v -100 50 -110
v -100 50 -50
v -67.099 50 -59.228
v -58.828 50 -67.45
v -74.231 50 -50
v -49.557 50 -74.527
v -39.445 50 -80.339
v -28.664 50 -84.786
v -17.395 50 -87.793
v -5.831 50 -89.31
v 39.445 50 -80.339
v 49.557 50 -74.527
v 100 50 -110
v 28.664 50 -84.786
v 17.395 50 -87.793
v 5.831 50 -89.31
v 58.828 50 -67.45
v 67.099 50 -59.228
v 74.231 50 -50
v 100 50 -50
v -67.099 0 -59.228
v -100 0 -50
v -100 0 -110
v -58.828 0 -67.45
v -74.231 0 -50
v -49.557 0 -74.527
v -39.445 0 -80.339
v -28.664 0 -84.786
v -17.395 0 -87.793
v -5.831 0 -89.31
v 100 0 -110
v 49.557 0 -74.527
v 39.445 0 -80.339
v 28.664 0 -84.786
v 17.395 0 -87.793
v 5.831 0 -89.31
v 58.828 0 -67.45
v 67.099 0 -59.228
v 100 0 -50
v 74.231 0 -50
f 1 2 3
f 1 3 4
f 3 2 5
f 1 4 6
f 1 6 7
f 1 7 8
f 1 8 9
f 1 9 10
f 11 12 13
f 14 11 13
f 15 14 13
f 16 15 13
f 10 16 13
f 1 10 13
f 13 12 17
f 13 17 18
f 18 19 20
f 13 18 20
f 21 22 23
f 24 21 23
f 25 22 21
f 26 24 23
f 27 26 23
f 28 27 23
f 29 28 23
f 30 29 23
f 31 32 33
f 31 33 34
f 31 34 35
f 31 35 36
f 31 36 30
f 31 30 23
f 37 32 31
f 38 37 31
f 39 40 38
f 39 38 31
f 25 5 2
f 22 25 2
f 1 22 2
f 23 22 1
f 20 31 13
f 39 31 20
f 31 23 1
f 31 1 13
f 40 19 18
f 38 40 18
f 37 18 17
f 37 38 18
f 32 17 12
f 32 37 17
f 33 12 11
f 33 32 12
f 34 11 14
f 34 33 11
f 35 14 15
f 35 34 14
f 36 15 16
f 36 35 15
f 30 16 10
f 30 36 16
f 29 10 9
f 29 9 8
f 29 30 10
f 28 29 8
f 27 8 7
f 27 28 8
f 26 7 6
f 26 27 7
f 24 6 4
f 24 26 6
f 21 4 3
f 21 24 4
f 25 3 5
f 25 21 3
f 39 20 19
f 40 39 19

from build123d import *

# Parameters (mm, degrees)
F1_DEPTH = 50


with BuildPart() as f1:
    # F0 (on Front) → F1 (new body)
    with BuildSketch(Plane.XZ):
        with BuildLine():
            ThreePointArc((74.231058, -50), (0, -89.5), (-74.231058, -50))
            Line((-74.231058, -50), (-100, -50))
            Line((-100, -50), (-100, -110))
            Line((-100, -110), (100, -110))
            Line((100, -110), (100, -50))
            Line((100, -50), (74.231058, -50))
        make_face()
    extrude(amount=-F1_DEPTH)


solid = f1.part
